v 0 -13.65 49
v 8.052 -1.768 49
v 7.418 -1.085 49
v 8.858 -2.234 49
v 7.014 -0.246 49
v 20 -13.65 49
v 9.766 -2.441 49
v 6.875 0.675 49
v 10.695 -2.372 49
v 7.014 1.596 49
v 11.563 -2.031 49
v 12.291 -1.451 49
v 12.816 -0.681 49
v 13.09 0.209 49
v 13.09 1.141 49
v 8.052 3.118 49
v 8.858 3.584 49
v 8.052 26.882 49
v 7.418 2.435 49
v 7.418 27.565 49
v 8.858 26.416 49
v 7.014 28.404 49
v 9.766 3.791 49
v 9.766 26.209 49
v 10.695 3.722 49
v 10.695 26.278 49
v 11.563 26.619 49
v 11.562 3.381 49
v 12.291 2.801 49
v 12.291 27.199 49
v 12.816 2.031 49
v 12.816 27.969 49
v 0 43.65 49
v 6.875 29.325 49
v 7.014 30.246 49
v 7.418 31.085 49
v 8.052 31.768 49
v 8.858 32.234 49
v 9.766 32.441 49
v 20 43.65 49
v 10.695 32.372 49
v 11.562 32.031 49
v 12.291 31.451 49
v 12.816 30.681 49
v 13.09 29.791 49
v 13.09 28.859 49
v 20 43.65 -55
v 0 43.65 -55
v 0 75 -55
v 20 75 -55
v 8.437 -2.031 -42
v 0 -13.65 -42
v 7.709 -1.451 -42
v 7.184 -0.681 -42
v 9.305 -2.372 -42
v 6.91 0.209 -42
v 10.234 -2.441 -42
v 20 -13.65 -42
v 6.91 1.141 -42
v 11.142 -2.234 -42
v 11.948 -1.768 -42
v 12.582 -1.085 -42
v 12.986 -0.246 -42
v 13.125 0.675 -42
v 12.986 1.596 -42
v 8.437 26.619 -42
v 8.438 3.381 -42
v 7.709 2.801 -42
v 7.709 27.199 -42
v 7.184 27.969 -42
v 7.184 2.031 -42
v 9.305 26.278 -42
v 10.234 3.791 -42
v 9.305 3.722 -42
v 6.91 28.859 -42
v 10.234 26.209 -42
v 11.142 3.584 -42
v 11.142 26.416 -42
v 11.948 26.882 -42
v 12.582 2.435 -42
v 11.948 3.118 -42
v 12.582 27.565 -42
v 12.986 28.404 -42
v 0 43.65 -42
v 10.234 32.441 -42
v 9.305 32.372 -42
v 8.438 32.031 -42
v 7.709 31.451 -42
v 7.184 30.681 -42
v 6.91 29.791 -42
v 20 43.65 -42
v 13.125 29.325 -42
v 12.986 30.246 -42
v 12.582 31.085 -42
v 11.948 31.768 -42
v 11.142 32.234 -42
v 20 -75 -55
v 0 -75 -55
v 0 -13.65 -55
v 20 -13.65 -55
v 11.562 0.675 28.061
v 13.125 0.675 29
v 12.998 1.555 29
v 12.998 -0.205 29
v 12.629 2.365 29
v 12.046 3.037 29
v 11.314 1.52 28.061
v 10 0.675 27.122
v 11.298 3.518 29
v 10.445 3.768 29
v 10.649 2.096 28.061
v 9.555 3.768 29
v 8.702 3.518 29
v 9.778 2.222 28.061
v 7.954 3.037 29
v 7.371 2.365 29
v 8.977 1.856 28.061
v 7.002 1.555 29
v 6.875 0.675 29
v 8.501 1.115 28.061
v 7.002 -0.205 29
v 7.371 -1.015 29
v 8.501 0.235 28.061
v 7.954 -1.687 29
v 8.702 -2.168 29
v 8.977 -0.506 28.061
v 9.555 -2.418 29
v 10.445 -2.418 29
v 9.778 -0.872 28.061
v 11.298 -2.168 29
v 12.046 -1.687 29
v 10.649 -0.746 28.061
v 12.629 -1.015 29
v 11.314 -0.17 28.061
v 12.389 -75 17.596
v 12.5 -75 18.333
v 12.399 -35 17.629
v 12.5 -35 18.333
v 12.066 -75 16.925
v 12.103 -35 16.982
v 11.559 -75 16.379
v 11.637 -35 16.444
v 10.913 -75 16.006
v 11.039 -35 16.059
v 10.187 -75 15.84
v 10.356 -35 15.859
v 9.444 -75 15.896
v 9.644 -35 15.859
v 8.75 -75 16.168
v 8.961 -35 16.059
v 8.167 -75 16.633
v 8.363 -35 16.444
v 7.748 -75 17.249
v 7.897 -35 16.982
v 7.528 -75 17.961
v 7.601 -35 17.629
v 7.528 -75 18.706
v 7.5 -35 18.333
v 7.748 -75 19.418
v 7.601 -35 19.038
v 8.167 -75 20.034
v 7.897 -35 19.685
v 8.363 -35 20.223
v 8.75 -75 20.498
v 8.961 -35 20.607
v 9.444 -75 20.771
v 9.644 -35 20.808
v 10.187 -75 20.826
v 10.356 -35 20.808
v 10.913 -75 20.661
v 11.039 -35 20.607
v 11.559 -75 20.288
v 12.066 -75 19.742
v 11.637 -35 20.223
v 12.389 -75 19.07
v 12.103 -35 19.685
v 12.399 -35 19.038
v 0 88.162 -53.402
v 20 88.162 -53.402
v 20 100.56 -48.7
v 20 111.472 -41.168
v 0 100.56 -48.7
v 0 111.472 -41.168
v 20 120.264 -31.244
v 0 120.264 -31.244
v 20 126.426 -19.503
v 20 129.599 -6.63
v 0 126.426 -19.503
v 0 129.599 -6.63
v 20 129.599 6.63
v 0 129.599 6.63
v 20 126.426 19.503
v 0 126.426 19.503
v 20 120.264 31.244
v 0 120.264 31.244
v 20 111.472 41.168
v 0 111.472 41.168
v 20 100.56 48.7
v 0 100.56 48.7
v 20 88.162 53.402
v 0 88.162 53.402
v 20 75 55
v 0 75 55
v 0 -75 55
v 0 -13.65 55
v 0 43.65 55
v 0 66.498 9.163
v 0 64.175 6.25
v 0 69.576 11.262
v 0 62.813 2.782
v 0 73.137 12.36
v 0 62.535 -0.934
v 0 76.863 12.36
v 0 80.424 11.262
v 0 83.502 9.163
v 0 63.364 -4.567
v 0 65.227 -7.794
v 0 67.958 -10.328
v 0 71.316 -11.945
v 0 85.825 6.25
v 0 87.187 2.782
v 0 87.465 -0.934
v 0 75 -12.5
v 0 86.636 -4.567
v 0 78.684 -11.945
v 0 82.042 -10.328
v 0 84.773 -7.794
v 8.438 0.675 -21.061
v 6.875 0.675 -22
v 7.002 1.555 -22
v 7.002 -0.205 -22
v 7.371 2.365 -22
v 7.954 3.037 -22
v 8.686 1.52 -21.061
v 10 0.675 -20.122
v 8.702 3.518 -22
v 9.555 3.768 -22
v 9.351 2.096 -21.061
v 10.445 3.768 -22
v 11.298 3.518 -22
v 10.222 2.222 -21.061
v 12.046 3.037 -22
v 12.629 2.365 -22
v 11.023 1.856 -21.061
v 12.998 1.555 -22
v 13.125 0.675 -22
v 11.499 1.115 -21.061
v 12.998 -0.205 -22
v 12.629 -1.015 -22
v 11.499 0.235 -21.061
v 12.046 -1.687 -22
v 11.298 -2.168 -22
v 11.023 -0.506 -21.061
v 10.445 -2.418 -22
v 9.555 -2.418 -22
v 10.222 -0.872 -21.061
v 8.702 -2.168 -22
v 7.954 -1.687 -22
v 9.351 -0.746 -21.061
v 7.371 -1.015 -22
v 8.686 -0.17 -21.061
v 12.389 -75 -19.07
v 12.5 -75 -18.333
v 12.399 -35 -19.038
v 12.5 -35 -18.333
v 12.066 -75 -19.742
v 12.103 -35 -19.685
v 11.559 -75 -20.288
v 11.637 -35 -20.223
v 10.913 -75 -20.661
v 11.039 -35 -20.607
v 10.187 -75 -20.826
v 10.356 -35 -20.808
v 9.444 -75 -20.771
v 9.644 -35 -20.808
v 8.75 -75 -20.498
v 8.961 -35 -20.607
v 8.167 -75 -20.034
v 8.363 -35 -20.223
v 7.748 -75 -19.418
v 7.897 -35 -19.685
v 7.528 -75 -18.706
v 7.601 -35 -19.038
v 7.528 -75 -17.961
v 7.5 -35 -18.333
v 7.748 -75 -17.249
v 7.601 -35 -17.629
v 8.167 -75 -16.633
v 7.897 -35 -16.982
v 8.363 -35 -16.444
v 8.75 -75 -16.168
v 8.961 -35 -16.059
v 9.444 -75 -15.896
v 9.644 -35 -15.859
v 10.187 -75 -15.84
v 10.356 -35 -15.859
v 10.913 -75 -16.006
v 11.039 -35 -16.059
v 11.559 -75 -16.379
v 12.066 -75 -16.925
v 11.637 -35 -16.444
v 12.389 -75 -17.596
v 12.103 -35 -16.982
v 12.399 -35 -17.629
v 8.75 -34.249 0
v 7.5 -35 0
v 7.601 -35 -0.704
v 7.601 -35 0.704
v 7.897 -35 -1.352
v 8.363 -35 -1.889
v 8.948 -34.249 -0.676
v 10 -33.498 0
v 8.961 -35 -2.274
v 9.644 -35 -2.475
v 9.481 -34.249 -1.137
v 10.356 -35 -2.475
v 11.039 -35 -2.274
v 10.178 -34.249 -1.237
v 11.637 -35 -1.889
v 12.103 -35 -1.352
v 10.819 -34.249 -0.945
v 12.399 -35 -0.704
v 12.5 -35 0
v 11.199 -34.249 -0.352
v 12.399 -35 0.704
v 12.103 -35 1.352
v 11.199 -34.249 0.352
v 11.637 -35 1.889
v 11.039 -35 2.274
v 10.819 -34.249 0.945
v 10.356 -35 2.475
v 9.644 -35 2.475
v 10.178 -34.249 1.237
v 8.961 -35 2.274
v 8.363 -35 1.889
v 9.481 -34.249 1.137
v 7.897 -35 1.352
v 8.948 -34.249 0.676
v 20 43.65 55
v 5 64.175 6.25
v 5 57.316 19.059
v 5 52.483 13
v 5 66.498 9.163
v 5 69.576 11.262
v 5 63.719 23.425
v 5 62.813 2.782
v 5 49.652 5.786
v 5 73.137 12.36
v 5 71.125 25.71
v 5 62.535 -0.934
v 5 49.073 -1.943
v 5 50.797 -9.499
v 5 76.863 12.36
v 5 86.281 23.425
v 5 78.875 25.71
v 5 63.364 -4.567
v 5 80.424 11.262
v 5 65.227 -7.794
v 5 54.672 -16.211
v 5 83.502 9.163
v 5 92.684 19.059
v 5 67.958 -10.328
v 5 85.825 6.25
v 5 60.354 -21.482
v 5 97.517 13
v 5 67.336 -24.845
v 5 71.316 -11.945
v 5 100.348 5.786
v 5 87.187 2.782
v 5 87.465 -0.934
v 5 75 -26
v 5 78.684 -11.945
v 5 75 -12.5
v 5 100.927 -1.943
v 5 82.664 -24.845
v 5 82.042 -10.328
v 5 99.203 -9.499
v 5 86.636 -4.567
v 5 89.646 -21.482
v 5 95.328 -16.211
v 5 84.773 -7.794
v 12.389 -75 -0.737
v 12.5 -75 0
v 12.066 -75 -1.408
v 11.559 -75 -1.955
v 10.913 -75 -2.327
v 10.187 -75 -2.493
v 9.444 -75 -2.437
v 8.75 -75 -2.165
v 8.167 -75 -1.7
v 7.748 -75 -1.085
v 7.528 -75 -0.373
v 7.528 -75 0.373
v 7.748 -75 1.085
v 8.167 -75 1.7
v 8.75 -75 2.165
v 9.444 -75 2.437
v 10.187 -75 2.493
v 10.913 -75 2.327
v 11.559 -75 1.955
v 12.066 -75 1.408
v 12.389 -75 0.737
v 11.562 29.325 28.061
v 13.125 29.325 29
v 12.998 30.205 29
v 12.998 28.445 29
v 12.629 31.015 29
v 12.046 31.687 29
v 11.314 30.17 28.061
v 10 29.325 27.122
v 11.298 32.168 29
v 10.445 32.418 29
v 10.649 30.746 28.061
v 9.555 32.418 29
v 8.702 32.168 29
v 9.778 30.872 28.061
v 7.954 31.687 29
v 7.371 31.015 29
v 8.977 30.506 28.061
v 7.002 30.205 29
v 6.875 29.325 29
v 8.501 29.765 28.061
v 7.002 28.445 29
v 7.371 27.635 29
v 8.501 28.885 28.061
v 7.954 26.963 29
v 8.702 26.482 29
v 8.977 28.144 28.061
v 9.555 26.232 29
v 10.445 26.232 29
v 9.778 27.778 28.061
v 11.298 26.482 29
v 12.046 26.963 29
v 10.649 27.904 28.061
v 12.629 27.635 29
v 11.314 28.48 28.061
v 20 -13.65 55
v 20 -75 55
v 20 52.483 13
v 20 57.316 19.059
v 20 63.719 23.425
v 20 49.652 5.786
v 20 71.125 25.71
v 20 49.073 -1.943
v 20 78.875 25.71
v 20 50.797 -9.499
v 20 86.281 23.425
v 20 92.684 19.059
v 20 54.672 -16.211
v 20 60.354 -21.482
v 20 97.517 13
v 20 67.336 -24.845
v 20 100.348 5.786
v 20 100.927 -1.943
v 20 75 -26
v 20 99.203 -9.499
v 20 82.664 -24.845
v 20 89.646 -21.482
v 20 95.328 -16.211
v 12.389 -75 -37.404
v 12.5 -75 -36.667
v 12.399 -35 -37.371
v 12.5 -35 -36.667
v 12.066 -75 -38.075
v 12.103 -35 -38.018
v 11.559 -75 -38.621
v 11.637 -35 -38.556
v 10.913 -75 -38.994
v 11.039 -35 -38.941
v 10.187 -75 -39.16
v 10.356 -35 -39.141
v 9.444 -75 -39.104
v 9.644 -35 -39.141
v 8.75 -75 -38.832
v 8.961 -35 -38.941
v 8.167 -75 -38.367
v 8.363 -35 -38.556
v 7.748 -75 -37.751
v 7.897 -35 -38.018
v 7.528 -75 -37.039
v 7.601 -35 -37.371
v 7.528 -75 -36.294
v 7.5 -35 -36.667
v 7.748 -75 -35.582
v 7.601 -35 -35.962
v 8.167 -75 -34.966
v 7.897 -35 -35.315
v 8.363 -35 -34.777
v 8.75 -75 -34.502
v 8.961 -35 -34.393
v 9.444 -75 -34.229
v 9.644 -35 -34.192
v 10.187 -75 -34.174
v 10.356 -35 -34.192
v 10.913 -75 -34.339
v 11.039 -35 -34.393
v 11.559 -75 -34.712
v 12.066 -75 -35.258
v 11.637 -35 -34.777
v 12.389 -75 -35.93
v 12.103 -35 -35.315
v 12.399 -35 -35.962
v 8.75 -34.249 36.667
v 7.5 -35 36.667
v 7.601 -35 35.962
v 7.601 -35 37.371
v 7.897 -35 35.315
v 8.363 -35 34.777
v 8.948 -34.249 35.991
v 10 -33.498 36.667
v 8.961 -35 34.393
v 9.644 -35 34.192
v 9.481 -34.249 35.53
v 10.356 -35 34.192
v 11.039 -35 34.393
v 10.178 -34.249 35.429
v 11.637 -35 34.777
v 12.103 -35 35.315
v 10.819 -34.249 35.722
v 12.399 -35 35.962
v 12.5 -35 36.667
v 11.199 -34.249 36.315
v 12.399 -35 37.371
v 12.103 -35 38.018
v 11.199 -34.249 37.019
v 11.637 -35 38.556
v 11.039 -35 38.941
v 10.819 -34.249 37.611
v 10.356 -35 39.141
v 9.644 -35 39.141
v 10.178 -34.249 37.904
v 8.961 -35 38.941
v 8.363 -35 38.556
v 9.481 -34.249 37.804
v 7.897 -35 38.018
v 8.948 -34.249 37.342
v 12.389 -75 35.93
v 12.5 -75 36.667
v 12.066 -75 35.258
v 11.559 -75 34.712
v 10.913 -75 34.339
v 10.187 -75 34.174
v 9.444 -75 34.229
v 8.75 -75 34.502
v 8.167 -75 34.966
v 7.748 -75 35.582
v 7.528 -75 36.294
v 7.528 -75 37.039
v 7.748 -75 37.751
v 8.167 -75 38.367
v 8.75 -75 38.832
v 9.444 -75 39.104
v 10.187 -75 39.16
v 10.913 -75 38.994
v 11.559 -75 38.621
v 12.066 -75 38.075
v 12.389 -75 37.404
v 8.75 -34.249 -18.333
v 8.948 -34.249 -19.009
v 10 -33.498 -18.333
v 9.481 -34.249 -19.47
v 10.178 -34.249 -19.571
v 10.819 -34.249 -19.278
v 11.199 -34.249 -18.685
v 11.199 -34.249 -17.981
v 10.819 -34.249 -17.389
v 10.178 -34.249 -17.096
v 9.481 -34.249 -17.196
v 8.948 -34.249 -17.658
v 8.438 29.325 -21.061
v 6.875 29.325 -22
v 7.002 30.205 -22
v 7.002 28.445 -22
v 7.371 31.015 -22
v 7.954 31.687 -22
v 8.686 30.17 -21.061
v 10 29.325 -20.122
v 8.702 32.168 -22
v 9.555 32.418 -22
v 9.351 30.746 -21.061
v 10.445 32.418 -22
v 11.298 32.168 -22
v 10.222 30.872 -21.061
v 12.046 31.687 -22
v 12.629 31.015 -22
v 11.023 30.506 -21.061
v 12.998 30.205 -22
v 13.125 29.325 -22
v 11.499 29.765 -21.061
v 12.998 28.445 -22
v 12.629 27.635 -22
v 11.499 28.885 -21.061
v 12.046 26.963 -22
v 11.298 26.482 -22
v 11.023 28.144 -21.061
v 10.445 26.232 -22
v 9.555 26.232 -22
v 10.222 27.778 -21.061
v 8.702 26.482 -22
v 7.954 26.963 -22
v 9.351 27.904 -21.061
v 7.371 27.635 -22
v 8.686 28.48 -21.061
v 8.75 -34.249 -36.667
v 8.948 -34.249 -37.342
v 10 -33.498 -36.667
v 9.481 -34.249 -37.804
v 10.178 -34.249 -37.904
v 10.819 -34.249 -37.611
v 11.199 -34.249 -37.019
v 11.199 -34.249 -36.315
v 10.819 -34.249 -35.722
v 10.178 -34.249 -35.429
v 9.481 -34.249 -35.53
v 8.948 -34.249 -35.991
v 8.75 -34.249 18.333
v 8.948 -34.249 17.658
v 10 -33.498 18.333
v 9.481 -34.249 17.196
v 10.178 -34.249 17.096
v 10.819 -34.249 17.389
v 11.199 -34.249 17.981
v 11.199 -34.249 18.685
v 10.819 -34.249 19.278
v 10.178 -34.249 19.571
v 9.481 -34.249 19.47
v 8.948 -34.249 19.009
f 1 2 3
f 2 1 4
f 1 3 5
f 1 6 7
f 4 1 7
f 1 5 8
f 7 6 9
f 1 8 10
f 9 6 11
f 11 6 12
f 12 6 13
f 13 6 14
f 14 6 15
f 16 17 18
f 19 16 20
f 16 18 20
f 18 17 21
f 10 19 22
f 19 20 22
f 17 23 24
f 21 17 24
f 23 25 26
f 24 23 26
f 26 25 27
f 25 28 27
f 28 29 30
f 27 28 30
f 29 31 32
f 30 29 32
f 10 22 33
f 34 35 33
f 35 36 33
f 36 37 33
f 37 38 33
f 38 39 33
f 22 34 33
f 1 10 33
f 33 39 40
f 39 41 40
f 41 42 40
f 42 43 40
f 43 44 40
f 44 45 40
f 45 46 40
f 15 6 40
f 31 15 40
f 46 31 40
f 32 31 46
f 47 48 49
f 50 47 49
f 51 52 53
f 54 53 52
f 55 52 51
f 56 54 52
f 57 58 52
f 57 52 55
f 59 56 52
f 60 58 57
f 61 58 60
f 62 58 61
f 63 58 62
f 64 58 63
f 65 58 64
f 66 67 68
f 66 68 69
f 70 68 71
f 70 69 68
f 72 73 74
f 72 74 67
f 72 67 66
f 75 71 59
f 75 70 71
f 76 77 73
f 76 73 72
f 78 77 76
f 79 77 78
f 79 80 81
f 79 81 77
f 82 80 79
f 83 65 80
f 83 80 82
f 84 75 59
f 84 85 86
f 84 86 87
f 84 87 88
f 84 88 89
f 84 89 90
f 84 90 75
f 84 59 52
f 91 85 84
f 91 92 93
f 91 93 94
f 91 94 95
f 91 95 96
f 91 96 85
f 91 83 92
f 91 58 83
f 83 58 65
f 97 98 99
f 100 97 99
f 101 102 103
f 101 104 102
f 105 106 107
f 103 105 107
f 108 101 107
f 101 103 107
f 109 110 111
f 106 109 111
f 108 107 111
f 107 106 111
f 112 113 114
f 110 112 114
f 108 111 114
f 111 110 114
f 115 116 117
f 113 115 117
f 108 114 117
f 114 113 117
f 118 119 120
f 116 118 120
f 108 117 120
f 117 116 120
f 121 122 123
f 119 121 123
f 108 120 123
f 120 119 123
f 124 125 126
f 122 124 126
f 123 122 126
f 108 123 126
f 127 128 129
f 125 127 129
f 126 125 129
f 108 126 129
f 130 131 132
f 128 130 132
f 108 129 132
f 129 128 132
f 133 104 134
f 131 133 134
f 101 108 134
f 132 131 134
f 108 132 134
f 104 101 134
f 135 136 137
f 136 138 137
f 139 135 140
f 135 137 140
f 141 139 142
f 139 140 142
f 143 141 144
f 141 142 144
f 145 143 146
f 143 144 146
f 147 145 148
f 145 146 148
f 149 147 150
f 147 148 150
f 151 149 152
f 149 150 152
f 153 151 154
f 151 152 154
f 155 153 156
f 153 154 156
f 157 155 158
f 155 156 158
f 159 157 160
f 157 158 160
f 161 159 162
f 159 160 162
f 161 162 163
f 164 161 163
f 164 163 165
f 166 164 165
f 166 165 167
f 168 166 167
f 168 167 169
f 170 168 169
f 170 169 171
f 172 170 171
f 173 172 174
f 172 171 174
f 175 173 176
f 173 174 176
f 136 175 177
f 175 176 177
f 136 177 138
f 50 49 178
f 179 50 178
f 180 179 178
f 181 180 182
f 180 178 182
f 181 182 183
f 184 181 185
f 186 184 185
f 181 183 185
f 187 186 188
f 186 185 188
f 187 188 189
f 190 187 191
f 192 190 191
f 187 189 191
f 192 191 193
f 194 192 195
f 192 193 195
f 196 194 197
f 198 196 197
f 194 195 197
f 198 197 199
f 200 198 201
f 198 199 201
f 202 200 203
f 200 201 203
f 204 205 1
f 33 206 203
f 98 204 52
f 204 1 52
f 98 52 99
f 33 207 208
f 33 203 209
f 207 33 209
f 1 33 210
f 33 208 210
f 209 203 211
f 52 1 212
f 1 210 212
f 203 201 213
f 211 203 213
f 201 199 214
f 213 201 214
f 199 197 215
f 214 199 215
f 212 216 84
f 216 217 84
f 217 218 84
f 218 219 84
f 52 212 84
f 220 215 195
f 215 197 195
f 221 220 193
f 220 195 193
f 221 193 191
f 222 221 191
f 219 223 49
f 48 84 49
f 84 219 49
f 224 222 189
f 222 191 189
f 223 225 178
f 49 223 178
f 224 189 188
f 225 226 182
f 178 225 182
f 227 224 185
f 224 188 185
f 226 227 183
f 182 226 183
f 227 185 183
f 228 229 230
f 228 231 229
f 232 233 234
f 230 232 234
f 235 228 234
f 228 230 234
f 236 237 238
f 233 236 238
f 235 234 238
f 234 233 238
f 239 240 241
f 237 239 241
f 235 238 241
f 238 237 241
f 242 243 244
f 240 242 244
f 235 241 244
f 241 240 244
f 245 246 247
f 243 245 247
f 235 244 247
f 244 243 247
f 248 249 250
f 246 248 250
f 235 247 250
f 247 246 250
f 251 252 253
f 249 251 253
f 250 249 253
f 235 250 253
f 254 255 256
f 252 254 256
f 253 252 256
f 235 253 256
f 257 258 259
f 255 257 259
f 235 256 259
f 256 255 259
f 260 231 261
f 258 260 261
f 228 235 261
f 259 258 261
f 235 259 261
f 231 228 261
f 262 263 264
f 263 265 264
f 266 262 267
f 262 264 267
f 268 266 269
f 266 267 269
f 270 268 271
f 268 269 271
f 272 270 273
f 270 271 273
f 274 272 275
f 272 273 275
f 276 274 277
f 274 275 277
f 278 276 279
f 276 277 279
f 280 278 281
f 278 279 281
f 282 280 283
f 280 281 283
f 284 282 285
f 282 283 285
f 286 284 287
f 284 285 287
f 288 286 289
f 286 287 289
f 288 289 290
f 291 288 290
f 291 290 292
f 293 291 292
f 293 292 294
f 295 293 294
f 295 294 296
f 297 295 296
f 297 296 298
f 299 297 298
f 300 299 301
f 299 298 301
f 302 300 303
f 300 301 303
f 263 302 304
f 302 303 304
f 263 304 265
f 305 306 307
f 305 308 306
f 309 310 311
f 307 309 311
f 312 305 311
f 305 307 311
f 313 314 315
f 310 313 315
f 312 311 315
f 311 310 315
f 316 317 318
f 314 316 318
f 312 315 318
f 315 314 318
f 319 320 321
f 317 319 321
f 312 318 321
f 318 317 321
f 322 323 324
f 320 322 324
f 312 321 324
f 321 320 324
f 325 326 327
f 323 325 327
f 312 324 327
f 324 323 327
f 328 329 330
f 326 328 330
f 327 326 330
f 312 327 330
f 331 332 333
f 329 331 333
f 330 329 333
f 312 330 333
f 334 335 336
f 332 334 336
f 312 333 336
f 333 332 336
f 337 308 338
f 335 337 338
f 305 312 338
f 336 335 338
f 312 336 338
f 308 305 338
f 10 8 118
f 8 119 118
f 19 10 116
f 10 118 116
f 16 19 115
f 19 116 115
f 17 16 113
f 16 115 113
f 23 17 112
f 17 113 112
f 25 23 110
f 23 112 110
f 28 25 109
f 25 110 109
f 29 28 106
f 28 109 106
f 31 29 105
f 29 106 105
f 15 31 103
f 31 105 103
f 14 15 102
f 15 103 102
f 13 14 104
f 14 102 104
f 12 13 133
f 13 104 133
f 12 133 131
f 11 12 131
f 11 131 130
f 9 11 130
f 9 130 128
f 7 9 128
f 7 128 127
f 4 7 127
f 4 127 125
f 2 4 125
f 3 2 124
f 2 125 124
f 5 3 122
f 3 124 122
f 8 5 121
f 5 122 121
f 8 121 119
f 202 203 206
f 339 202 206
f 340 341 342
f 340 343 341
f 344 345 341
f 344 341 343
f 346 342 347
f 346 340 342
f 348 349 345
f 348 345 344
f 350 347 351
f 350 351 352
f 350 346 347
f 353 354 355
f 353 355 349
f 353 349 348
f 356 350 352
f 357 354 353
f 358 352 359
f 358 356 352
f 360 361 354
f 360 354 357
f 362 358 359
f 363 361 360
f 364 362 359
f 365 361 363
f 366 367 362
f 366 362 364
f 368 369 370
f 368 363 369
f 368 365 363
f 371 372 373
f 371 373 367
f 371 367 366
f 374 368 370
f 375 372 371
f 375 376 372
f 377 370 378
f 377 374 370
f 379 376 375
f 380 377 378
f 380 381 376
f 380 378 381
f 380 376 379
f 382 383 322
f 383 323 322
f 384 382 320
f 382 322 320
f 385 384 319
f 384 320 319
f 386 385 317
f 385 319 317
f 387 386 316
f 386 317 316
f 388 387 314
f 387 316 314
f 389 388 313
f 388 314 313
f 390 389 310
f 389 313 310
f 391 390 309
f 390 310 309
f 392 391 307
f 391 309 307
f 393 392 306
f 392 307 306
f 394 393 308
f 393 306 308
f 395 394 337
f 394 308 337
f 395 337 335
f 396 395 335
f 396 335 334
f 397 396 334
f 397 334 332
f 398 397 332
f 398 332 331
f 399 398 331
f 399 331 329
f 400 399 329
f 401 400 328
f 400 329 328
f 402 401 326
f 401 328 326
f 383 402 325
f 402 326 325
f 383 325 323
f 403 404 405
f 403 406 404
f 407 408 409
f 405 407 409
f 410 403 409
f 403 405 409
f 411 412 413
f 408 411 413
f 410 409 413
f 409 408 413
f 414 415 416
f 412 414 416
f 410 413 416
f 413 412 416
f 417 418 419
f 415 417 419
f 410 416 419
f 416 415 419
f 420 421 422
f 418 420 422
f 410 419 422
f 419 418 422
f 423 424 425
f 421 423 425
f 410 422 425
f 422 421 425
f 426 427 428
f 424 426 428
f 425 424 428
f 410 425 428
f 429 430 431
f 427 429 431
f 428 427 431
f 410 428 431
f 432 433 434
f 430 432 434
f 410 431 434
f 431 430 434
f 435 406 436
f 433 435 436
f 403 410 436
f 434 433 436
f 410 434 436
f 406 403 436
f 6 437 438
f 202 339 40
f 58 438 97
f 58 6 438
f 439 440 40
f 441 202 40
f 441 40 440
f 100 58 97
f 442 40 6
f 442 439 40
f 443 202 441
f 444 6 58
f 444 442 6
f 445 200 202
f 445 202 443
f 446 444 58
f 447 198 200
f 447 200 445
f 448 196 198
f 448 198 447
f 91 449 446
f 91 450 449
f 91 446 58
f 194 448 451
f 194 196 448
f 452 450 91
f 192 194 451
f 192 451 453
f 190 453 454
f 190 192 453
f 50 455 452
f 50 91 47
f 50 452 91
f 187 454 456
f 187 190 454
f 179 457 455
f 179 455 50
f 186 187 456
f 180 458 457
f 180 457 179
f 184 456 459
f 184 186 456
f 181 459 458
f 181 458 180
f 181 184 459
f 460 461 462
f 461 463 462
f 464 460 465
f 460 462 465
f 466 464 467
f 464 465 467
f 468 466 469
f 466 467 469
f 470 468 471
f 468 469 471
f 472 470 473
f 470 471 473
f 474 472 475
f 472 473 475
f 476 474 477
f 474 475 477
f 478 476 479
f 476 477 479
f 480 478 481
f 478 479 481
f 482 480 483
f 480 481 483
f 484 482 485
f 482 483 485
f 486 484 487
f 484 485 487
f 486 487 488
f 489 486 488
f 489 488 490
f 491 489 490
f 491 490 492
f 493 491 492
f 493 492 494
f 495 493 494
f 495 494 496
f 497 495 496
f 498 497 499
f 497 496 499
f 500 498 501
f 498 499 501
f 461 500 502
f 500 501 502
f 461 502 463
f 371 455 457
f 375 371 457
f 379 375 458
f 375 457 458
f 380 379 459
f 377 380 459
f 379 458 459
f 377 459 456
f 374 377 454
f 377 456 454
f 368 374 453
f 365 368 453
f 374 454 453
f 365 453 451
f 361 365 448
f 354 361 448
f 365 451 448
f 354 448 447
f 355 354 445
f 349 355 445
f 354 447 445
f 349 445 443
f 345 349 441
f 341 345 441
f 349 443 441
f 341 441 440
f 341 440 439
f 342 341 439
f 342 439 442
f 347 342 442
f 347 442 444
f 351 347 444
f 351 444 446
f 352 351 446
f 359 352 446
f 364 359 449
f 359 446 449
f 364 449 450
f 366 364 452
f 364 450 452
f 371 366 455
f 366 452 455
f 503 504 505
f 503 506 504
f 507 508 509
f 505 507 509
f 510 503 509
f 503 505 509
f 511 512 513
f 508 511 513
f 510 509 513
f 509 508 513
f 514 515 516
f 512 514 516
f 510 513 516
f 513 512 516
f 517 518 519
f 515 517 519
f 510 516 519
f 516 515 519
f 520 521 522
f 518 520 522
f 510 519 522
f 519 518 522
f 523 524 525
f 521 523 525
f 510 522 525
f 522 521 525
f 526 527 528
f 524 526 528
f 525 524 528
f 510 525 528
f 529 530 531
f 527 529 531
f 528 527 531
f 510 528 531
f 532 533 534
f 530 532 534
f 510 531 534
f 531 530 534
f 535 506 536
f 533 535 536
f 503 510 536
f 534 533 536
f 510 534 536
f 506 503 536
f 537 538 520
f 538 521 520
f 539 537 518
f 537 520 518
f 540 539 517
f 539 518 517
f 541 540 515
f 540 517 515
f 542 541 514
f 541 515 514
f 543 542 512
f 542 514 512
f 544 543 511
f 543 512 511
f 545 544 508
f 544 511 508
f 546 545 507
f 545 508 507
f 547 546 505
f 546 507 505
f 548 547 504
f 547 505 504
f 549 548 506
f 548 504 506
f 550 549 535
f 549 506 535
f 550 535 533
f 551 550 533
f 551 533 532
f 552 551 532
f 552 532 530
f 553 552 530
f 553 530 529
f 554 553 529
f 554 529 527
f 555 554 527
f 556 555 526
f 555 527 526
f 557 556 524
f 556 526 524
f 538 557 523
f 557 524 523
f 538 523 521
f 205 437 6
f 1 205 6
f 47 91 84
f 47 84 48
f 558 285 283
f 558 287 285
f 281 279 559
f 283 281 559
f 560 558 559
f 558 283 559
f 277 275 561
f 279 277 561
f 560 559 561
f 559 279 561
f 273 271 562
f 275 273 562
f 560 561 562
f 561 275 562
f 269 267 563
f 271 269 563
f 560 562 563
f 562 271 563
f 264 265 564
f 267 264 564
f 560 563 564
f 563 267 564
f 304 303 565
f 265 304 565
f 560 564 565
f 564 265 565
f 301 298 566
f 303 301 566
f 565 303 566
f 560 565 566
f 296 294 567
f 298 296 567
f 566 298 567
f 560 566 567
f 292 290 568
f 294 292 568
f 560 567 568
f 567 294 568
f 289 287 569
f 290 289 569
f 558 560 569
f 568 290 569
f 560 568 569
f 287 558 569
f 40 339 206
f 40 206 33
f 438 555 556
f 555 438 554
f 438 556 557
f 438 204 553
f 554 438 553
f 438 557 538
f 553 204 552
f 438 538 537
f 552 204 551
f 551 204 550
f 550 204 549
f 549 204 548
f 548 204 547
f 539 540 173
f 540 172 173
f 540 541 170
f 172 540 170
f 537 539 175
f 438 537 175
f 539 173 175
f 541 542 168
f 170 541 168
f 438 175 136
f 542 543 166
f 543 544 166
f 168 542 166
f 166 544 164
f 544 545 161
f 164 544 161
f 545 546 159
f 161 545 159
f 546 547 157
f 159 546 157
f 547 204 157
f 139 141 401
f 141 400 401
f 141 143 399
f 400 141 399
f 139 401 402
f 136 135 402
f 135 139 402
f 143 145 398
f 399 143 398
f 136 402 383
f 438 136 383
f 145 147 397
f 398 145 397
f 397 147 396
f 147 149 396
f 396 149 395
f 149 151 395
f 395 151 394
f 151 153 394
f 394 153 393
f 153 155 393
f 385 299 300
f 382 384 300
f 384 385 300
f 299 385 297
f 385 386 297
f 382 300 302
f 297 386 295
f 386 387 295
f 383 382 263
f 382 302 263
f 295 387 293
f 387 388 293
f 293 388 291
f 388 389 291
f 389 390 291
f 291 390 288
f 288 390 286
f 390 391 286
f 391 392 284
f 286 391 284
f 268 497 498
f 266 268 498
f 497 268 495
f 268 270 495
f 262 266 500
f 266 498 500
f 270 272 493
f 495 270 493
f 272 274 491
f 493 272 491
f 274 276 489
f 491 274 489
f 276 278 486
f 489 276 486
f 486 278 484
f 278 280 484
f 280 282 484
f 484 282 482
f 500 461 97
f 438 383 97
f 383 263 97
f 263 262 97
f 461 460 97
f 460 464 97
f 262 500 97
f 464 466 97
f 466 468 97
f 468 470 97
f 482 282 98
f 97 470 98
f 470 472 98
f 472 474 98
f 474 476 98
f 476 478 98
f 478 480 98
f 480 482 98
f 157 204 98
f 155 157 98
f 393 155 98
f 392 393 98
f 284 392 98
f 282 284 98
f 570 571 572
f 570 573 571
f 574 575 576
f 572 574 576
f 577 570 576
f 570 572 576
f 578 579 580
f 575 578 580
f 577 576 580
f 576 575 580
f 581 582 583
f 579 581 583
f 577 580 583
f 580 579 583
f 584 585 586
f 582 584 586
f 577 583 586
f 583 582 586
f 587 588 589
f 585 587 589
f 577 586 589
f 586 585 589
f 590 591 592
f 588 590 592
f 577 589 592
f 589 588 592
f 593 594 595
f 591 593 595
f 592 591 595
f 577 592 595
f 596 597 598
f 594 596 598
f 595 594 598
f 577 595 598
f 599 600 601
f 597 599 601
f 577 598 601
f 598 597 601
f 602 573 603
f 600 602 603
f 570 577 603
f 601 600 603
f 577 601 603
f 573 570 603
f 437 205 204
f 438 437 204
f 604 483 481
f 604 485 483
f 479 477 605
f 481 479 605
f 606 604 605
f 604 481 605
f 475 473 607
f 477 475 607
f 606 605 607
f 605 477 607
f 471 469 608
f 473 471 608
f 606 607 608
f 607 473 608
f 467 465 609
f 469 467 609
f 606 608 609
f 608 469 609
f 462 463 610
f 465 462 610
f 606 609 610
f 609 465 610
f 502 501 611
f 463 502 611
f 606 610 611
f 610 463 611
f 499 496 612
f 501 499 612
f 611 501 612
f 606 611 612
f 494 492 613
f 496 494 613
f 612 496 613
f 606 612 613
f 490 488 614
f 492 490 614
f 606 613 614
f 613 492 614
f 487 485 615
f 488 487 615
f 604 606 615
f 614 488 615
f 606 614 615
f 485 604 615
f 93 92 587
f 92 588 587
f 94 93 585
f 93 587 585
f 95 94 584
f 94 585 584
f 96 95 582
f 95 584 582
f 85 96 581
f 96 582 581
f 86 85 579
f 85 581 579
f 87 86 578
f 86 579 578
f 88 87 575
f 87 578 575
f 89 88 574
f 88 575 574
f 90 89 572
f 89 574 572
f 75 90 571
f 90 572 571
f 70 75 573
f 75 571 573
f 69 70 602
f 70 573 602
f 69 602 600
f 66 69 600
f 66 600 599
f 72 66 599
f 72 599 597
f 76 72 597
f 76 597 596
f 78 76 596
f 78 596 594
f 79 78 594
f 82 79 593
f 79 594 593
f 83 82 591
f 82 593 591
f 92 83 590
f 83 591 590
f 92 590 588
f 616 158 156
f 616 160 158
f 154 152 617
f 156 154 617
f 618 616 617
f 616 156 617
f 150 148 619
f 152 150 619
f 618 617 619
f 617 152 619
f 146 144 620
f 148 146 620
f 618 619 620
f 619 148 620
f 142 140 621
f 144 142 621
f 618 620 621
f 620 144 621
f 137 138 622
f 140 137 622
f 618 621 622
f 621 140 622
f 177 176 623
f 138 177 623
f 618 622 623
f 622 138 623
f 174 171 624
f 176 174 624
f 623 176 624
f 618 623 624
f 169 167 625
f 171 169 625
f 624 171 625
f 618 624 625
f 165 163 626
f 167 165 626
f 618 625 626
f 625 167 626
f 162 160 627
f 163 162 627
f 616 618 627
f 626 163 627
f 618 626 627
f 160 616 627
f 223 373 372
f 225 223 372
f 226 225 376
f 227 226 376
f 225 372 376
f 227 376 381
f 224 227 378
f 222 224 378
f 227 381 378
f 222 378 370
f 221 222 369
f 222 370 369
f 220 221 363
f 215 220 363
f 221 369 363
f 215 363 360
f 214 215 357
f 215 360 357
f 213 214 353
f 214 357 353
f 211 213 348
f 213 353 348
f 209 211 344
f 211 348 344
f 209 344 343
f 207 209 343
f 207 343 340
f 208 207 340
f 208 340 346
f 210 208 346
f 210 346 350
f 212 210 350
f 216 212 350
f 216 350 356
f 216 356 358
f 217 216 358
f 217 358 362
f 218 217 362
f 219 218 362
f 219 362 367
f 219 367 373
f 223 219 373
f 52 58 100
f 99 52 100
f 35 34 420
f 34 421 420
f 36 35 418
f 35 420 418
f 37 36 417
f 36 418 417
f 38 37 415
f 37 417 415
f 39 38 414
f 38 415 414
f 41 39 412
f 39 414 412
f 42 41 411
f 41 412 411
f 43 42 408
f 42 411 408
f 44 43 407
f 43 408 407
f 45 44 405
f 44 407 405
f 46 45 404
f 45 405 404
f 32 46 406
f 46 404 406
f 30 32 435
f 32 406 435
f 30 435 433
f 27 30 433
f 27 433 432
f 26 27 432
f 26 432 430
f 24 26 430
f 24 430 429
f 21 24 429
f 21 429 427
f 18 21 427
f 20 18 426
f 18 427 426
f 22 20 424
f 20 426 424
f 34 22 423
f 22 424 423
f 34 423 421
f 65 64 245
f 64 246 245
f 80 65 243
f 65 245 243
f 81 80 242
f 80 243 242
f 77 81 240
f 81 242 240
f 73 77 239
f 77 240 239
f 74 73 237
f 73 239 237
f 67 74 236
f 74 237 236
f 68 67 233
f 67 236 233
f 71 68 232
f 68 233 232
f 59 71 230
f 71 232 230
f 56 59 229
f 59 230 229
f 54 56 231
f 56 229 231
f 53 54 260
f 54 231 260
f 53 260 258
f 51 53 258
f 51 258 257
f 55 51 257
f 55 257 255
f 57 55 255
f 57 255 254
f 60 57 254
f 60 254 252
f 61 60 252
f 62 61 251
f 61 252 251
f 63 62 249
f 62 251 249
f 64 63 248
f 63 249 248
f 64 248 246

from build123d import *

# Parameters (mm, degrees)
BOSS_EXTRUDE1_DEPTH              = 20
SKETCH3_R                        = 26
CUT_EXTRUDE1_DEPTH               = 15
SKETCH4_R                        = 12.5
CUT_EXTRUDE2_DEPTH               = 11.1125
TAP_DRILL_FOR_M6X1_0_TAP2_D      = 5
TAP_DRILL_FOR_M6X1_0_TAP2_DEPTH  = 40
TAP_DRILL_FOR_M6X1_0_TAP2_TIP    = 1.502151548
SKETCH12_W                       = 6
SKETCH12_H                       = 57.3
SKETCH12_W_2                     = 13
CUT_EXTRUDE3_DEPTH               = 20
TAP_DRILL_FOR_M6_HELICOIL1_D     = 6.25
TAP_DRILL_FOR_M6_HELICOIL1_DEPTH = 20
TAP_DRILL_FOR_M6_HELICOIL1_TIP   = 1.877689434
TAP_DRILL_FOR_M6_HELICOIL2_D     = 6.25
TAP_DRILL_FOR_M6_HELICOIL2_DEPTH = 20
TAP_DRILL_FOR_M6_HELICOIL2_TIP   = 1.877689434


with BuildPart() as part:
    # Sketch2 → Boss-Extrude1 (new body)
    with BuildSketch(Plane(origin=(0, 0, 0), x_dir=(0, 0, -1), z_dir=(1, 0, 0))):
        with BuildLine():
            Line((55, -75), (55, 75))
            ThreePointArc((55, 75), (0, 20), (-55, 75))
            Line((-55, 75), (-55, -75))
            Line((-55, -75), (55, -75))
        make_face()
        with BuildLine():
            ThreePointArc((-55, 75), (0, 20), (55, 75))
            Line((55, 75), (-55, 75))
        make_face()
        with BuildLine():
            Line((-55, 75), (55, 75))
            ThreePointArc((55, 75), (0, 130), (-55, 75))
        make_face()
    extrude(amount=BOSS_EXTRUDE1_DEPTH)

    # Sketch3 → Cut-Extrude1 (cut)
    with BuildSketch(Plane(origin=(20, 0, 0), x_dir=(0, 0, -1), z_dir=(1, 0, 0))):
        with Locations((0, 75)):
            Circle(SKETCH3_R)
    extrude(amount=-CUT_EXTRUDE1_DEPTH, mode=Mode.SUBTRACT)

    # Sketch4 → Cut-Extrude2 (cut)
    with BuildSketch(Plane(origin=(5, 0, 0), x_dir=(0, 0, -1), z_dir=(1, 0, 0))):
        with Locations((0, 75)):
            Circle(SKETCH4_R)
    extrude(amount=-CUT_EXTRUDE2_DEPTH, mode=Mode.SUBTRACT)

    # Tap Drill for M6x1.0 Tap2
    with Locations(Plane(origin=(0, -75, 0), x_dir=(-1, 0, 0), z_dir=(0, -1, 0))):
        with Locations((-10, -36.666666667), (-10, -18.333333333), (-10, 0), (-10, 18.333333333), (-10, 36.666666667)):
            Hole(TAP_DRILL_FOR_M6X1_0_TAP2_D / 2, depth=TAP_DRILL_FOR_M6X1_0_TAP2_DEPTH)
            with Locations((0, 0, -(TAP_DRILL_FOR_M6X1_0_TAP2_DEPTH + TAP_DRILL_FOR_M6X1_0_TAP2_TIP / 2))):  # 118° drill point
                Cone(0, TAP_DRILL_FOR_M6X1_0_TAP2_D / 2, TAP_DRILL_FOR_M6X1_0_TAP2_TIP, mode=Mode.SUBTRACT)

    # Sketch12 → Cut-Extrude3 (cut)
    with BuildSketch(Plane(origin=(20, 0, 0), x_dir=(0, 0, -1), z_dir=(1, 0, 0))):
        with Locations((-52, 15)):
            Rectangle(SKETCH12_W, SKETCH12_H)
        with Locations((48.5, 15)):
            Rectangle(SKETCH12_W_2, SKETCH12_H)
    extrude(amount=-CUT_EXTRUDE3_DEPTH, mode=Mode.SUBTRACT)

    # Tap Drill for M6 Helicoil1
    with Locations(Plane(origin=(10, 29.325, 49), x_dir=(1, 0, 0), z_dir=(0, 0, 1))):
        with Locations((0, 0), (0, -28.65)):
            Hole(TAP_DRILL_FOR_M6_HELICOIL1_D / 2, depth=TAP_DRILL_FOR_M6_HELICOIL1_DEPTH)
            with Locations((0, 0, -(TAP_DRILL_FOR_M6_HELICOIL1_DEPTH + TAP_DRILL_FOR_M6_HELICOIL1_TIP / 2))):  # 118° drill point
                Cone(0, TAP_DRILL_FOR_M6_HELICOIL1_D / 2, TAP_DRILL_FOR_M6_HELICOIL1_TIP, mode=Mode.SUBTRACT)

    # Tap Drill for M6 Helicoil2
    with Locations(Plane(origin=(0, 0, -42), x_dir=(-1, 0, 0), z_dir=(0, 0, -1))):
        with Locations((-10, 29.325), (-10, 0.675)):
            Hole(TAP_DRILL_FOR_M6_HELICOIL2_D / 2, depth=TAP_DRILL_FOR_M6_HELICOIL2_DEPTH)
            with Locations((0, 0, -(TAP_DRILL_FOR_M6_HELICOIL2_DEPTH + TAP_DRILL_FOR_M6_HELICOIL2_TIP / 2))):  # 118° drill point
                Cone(0, TAP_DRILL_FOR_M6_HELICOIL2_D / 2, TAP_DRILL_FOR_M6_HELICOIL2_TIP, mode=Mode.SUBTRACT)


solid = part.part
